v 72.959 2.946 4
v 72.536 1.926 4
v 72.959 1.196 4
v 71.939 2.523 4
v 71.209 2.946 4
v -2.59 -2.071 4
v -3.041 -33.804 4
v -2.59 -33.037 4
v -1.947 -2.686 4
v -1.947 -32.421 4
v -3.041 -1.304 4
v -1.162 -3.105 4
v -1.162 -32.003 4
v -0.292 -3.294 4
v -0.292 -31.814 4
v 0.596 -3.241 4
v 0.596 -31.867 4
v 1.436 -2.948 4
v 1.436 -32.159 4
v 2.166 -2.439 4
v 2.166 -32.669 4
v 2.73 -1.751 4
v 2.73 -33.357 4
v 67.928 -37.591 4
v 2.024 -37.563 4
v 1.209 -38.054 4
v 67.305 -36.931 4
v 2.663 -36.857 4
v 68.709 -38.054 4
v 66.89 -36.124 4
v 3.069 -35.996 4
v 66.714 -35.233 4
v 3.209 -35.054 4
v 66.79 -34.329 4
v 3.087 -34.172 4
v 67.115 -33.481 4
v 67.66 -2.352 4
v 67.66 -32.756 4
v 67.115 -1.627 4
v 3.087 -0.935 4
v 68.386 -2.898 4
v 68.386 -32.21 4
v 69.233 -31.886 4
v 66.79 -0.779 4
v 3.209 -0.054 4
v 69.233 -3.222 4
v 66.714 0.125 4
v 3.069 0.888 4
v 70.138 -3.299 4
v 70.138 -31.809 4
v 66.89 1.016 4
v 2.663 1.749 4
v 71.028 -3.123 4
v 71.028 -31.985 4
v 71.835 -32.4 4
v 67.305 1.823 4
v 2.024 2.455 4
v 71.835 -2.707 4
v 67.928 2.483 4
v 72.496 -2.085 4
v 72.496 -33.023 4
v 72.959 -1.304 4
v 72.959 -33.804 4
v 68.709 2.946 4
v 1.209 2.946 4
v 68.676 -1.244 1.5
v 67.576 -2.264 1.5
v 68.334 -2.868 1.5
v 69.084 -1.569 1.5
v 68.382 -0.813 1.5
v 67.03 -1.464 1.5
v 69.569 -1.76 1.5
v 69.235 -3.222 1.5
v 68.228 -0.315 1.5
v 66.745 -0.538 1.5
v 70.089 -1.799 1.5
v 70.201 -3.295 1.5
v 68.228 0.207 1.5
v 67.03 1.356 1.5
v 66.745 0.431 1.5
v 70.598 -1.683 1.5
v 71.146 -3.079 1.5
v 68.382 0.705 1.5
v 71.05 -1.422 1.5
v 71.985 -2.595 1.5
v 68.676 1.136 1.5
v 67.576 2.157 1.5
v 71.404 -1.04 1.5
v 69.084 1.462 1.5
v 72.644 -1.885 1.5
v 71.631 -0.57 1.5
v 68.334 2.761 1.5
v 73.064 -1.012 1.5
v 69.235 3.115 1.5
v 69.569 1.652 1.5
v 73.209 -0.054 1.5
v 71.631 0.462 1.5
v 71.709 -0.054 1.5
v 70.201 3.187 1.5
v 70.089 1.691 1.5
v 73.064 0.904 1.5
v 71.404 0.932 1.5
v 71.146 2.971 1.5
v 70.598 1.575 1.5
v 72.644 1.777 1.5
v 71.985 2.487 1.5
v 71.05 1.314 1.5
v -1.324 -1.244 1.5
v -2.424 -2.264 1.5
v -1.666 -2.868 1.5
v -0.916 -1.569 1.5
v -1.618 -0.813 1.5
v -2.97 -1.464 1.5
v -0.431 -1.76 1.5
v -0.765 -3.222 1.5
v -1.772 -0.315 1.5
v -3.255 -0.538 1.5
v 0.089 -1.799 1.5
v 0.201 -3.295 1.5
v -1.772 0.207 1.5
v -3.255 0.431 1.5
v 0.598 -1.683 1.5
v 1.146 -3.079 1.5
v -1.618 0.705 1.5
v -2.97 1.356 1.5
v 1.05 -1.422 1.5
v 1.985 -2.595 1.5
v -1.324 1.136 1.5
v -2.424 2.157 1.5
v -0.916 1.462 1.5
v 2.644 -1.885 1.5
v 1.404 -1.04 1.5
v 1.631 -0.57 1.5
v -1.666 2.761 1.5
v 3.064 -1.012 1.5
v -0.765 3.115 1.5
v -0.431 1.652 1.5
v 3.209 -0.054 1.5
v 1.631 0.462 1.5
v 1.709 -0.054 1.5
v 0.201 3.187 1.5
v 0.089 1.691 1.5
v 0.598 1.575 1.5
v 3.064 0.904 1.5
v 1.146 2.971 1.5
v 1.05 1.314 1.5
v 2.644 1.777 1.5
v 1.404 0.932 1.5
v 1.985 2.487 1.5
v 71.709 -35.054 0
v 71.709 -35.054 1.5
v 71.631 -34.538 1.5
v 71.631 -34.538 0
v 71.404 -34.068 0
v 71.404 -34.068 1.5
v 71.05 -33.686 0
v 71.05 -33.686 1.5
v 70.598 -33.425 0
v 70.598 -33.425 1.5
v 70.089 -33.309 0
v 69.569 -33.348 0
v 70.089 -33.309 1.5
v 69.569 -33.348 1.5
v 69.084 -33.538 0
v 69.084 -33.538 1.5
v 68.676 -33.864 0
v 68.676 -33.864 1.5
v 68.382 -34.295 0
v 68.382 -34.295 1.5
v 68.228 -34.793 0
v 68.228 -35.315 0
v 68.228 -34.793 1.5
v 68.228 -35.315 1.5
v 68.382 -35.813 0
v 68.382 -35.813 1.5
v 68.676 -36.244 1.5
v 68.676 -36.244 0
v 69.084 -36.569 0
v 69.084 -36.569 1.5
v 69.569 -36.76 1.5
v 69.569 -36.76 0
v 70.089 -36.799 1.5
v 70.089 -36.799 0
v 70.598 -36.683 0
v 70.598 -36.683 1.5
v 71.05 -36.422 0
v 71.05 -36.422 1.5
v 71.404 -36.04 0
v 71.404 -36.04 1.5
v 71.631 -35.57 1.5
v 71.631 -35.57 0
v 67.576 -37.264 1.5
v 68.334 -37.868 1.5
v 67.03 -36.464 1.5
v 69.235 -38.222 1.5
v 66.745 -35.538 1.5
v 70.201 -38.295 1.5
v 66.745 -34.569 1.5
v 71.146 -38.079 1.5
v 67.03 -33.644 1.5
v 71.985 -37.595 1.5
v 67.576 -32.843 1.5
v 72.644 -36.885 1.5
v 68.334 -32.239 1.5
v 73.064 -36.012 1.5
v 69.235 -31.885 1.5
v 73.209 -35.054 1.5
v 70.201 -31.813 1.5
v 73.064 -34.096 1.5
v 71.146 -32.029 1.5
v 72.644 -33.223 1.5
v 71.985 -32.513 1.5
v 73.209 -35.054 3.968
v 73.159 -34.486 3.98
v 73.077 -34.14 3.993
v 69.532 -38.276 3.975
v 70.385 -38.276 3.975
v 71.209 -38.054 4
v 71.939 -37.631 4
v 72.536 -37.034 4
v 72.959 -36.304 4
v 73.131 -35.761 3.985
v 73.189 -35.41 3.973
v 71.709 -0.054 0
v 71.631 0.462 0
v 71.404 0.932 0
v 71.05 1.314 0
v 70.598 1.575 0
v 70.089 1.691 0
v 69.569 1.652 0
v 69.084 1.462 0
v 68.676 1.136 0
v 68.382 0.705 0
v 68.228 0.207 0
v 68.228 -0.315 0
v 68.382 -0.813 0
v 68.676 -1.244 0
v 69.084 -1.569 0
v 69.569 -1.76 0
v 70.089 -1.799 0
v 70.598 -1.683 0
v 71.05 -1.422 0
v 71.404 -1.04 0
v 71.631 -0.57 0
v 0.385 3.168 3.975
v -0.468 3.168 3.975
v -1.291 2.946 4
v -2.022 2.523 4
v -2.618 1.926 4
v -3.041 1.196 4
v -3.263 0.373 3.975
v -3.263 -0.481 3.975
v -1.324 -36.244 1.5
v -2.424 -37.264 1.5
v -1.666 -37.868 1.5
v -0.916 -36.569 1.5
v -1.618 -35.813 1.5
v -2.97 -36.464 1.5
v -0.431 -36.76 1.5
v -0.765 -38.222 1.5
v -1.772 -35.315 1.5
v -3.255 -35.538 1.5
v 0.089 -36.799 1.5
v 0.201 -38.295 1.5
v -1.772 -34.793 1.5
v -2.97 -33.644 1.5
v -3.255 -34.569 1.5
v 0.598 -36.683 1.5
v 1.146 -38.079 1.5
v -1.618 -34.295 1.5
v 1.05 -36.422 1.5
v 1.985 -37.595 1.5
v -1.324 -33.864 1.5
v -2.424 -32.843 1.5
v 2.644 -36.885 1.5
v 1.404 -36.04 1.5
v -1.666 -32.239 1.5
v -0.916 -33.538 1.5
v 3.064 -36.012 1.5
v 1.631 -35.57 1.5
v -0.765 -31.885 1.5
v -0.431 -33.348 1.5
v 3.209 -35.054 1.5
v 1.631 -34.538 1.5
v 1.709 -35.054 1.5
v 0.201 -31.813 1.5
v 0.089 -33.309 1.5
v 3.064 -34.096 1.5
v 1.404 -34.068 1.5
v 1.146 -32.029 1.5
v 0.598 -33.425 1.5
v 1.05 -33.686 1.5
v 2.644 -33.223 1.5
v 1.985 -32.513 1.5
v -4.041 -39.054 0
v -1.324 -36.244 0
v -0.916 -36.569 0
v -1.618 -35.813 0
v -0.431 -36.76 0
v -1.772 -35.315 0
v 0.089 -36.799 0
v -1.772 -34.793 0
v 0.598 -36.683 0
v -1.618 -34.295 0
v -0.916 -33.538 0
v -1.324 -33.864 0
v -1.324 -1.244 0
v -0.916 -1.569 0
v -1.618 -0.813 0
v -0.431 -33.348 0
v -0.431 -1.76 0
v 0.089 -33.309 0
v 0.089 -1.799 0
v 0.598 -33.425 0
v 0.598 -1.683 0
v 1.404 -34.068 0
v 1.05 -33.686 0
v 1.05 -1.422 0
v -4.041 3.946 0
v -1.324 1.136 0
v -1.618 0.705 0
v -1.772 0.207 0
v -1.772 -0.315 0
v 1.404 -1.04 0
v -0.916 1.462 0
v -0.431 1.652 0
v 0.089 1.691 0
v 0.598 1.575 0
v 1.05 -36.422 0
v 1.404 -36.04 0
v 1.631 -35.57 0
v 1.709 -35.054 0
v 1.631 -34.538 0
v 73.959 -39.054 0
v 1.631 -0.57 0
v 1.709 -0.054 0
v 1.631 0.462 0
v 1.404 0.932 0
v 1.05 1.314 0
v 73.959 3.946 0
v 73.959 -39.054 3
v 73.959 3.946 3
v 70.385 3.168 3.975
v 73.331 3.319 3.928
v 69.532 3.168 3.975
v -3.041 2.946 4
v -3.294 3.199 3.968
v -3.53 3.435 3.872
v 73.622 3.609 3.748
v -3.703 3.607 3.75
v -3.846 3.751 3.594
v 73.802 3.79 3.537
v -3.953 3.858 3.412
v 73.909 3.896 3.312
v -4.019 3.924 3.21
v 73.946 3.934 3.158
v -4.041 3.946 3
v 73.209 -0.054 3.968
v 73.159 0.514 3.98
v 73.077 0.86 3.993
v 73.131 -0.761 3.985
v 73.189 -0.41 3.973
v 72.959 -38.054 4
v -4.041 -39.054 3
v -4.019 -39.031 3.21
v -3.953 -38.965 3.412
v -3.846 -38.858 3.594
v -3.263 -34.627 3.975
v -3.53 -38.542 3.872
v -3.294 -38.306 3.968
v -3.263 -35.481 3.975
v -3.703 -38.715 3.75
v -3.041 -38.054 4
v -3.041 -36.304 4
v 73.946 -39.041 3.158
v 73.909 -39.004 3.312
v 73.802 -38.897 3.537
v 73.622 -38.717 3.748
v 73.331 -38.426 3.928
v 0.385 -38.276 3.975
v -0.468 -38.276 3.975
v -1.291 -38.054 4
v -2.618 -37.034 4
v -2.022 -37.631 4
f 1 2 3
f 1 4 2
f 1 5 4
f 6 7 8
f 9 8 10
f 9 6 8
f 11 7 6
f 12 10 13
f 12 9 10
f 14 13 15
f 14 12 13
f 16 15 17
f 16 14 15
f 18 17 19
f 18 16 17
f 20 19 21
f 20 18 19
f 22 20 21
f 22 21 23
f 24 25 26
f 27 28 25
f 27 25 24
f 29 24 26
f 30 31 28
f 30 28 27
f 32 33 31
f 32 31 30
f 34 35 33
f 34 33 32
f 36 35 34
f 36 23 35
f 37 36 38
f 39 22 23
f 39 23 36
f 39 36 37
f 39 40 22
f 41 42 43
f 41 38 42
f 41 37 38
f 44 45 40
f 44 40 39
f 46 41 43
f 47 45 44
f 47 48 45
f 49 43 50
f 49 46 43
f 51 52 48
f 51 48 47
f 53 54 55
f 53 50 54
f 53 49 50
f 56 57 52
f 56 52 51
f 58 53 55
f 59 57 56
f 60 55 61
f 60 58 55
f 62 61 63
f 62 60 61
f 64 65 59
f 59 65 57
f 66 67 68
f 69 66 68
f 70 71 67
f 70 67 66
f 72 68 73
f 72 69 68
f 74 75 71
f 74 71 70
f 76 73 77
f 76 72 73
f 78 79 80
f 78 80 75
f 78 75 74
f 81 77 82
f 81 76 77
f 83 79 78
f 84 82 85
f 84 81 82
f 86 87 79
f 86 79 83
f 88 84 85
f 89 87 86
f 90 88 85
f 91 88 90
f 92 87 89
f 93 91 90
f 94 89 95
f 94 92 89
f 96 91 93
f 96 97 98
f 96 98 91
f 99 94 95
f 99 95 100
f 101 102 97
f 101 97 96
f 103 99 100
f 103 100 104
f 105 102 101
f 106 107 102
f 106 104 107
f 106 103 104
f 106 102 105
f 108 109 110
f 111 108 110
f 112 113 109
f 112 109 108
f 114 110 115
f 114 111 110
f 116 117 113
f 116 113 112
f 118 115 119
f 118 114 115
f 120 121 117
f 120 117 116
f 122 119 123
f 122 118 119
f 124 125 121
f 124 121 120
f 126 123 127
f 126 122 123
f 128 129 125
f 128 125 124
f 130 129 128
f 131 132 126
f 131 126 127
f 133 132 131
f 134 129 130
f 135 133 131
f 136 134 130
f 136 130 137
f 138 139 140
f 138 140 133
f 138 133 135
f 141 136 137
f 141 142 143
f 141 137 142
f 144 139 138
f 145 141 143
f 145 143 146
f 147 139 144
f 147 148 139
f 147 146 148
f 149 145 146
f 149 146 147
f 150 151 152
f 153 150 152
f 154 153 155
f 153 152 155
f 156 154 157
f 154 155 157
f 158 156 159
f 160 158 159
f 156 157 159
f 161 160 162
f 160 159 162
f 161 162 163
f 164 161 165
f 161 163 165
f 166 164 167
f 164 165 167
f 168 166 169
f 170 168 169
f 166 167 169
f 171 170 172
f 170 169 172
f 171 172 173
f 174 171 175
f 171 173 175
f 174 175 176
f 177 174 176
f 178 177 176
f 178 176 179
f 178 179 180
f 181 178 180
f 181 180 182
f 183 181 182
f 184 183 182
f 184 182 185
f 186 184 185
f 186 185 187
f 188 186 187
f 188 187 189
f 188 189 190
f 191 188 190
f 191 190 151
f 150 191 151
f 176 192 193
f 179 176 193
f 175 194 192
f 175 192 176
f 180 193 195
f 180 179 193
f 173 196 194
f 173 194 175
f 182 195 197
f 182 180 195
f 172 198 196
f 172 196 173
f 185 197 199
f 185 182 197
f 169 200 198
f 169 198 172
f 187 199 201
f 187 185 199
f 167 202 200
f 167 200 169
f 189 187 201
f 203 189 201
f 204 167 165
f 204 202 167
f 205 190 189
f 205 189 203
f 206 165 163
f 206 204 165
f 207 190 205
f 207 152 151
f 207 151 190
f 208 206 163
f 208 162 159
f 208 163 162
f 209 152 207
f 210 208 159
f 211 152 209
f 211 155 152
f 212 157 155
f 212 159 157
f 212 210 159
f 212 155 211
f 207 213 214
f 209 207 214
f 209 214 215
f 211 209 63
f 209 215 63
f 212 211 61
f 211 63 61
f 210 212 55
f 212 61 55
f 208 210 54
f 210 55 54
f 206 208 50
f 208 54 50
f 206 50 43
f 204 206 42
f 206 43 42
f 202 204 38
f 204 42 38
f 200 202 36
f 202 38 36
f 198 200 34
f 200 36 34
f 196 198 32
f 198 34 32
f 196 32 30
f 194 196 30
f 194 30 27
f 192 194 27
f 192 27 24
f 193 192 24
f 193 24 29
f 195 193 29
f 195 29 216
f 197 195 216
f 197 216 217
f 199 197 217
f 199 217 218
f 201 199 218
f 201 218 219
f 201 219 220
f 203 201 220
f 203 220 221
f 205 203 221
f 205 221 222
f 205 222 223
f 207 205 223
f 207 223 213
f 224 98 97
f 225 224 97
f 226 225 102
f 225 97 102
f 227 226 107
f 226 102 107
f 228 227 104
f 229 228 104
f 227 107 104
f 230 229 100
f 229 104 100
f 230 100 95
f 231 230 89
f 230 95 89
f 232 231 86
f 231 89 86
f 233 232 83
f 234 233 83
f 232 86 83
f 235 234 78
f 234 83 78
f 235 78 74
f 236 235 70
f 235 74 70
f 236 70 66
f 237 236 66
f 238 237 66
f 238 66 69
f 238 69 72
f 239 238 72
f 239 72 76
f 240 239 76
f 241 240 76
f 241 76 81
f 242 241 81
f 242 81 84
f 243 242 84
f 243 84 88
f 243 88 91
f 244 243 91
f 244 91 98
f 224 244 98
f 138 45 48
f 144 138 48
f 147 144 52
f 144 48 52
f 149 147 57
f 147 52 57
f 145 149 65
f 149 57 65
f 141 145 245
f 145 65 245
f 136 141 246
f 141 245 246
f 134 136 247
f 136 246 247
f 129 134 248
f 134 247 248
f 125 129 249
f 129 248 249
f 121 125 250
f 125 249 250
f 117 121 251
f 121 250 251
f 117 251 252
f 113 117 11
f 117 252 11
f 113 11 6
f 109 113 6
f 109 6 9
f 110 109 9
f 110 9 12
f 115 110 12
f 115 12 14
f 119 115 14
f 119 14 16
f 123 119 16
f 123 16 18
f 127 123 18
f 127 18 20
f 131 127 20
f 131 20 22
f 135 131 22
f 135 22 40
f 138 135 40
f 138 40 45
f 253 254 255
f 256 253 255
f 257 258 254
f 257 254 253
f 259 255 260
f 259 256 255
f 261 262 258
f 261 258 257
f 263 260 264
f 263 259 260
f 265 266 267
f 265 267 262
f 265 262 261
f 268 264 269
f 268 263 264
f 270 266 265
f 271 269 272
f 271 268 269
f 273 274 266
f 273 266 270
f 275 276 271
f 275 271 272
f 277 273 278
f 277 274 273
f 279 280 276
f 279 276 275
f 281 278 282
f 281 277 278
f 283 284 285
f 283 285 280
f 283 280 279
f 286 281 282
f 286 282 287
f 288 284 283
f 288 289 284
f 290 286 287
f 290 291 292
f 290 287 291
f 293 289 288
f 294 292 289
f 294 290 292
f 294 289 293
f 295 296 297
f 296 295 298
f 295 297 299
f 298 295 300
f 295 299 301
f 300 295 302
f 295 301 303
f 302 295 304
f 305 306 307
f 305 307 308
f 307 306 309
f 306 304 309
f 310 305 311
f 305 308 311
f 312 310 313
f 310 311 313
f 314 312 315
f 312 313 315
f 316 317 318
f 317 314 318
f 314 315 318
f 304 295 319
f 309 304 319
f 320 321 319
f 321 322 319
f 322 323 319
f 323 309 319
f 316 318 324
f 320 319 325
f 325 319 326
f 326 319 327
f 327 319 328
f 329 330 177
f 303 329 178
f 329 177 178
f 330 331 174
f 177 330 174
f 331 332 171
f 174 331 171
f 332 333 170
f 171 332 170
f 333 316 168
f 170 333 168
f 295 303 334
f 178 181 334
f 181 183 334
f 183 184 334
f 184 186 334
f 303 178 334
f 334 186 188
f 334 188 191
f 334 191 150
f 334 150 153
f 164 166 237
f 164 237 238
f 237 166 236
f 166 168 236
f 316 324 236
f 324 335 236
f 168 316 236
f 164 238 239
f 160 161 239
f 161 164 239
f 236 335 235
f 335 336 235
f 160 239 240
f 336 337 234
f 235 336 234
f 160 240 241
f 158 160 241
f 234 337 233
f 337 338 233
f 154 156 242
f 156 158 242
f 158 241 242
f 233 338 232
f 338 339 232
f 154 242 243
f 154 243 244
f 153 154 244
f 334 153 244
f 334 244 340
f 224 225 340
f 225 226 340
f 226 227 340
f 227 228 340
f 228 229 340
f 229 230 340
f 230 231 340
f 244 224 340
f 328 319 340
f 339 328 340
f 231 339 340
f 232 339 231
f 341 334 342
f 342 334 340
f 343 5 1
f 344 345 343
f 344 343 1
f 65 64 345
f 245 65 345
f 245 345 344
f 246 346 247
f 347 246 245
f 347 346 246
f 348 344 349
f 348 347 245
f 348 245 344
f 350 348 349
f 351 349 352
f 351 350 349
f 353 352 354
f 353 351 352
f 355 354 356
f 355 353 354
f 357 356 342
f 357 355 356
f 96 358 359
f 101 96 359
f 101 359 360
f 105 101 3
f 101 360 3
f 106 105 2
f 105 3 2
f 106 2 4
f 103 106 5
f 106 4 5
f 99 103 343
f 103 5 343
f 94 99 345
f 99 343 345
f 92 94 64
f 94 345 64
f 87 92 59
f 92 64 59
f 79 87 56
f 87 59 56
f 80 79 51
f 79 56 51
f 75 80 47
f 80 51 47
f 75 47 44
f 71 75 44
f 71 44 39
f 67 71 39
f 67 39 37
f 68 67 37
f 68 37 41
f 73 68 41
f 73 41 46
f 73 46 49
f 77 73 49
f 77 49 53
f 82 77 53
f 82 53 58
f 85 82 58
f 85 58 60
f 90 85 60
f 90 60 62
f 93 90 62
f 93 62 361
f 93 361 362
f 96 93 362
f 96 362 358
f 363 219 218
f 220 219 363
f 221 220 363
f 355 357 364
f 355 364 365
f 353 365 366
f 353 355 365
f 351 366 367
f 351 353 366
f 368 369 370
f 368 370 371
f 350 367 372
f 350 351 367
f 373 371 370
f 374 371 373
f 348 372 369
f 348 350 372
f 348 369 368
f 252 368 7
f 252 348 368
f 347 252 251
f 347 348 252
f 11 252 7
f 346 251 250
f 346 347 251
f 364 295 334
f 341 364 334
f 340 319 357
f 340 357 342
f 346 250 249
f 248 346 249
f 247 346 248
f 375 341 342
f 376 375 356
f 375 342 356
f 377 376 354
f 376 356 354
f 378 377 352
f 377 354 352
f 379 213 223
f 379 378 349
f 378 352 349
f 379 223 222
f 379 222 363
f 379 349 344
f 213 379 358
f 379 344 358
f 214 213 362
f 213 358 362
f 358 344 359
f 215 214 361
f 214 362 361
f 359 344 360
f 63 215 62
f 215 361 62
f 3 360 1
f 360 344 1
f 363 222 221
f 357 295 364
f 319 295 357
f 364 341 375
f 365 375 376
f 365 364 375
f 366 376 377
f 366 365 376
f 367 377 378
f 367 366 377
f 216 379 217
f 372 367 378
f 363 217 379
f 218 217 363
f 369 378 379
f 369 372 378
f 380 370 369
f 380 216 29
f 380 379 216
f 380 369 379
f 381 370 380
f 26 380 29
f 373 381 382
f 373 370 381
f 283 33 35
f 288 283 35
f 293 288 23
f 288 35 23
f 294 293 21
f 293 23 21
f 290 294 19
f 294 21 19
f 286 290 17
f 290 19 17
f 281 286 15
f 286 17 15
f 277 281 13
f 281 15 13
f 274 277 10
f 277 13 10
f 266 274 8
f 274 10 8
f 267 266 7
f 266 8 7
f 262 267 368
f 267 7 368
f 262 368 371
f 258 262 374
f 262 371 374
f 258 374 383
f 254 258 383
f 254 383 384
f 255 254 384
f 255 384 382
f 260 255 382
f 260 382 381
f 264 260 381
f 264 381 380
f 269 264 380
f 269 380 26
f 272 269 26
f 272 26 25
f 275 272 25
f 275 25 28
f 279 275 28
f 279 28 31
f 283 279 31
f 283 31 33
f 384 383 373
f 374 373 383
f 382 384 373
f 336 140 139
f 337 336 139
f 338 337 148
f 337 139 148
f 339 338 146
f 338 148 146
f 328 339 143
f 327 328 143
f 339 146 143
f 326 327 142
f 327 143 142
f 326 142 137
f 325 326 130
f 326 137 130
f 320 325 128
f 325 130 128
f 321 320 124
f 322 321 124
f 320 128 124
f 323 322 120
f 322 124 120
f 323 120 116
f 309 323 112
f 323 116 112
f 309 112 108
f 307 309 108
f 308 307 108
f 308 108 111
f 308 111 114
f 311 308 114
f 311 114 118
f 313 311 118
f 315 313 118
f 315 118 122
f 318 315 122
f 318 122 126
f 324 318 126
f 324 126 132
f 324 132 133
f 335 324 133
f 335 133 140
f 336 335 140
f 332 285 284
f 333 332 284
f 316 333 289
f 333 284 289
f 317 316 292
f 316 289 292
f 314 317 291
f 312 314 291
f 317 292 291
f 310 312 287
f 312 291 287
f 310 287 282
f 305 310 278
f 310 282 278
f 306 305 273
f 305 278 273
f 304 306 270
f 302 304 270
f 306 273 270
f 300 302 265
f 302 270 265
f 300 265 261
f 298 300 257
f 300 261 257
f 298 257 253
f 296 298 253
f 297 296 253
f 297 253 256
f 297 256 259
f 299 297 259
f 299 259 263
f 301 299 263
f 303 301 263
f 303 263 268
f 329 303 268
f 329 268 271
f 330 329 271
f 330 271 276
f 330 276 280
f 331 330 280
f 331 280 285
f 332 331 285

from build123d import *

# Parameters (mm, degrees)
F0_W        = 78
F0_H        = 43
F1_DEPTH    = 4
F2_R        = 1.75
F3_DEPTH    = 4.001
F4_R        = 3.25
F5_DEPTH    = 2.5
F6_T1_DEPTH = 48
F6_T3_DEPTH = 83


# Not quite as in the source:
# - a fillet or chamfer that OpenCascade refuses, or shapes differently, is made with other operations: its cross-section is extruded or revolved along the edge and cut away or added


with BuildPart() as f1:
    # F0 (on Top) → F1 (new body)
    with BuildSketch(Plane.XY):
        with Locations((34.9585738778, -17.5538536012)):
            Rectangle(F0_W, F0_H)
    extrude(amount=F1_DEPTH)

    # F2 (on face) → F3 (cut, through all)
    with BuildSketch(Plane.XY.offset(4)):
        with Locations((-0.0414261222, -0.0538536012)):
            Circle(F2_R)
        with Locations((69.9585738778, -0.0538536012)):
            Circle(F2_R)
        with Locations((69.9585738778, -35.0538536012)):
            Circle(F2_R)
        with Locations((-0.0414261222, -35.0538536012)):
            Circle(F2_R)
    extrude(amount=-F3_DEPTH, mode=Mode.SUBTRACT)

    # F4 (on face) → F5 (cut)
    with BuildSketch(Plane.XY.offset(4)):
        with Locations((-0.0414261222, -0.0538536012)):
            Circle(F4_R)
        with Locations((69.9585738778, -0.0538536012)):
            Circle(F4_R)
        with Locations((69.9585738778, -35.0538536012)):
            Circle(F4_R)
        with Locations((-0.0414261222, -35.0538536012)):
            Circle(F4_R)
    extrude(amount=-F5_DEPTH, mode=Mode.SUBTRACT)

    # F6: fillet of radius 1 on 4 edges, made by hand

    # F6_s2 → F6_t1 (cut)
    with BuildSketch(Plane.XZ.offset(-6.4461463988)):
        with BuildLine():
            ThreePointArc((-4.0414261222, 3), (-3.7485329034, 3.7071067812), (-3.0414261222, 4))
            Line((-3.0414261222, 4), (-4.0414261222, 4))
            Line((-4.0414261222, 4), (-4.0414261222, 3))
        make_face()
        with BuildLine():
            ThreePointArc((73.9585738778, 3), (73.665680659, 3.7071067812), (72.9585738778, 4))
            Line((72.9585738778, 4), (73.9585738778, 4))
            Line((73.9585738778, 4), (73.9585738778, 3))
        make_face()
    extrude(amount=F6_T1_DEPTH, mode=Mode.SUBTRACT)

    # F6_s4 → F6_t3 (cut)
    with BuildSketch(Plane.YZ.offset(-6.5414261222)):
        with BuildLine():
            ThreePointArc((-39.0538536012, 3), (-38.7609603824, 3.7071067812), (-38.0538536012, 4))
            Line((-38.0538536012, 4), (-39.0538536012, 4))
            Line((-39.0538536012, 4), (-39.0538536012, 3))
        make_face()
        with BuildLine():
            ThreePointArc((2.9461463988, 4), (3.65325318, 3.7071067812), (3.9461463988, 3))
            Line((3.9461463988, 3), (3.9461463988, 4))
            Line((3.9461463988, 4), (2.9461463988, 4))
        make_face()
    extrude(amount=F6_T3_DEPTH, mode=Mode.SUBTRACT)


solid = f1.part
